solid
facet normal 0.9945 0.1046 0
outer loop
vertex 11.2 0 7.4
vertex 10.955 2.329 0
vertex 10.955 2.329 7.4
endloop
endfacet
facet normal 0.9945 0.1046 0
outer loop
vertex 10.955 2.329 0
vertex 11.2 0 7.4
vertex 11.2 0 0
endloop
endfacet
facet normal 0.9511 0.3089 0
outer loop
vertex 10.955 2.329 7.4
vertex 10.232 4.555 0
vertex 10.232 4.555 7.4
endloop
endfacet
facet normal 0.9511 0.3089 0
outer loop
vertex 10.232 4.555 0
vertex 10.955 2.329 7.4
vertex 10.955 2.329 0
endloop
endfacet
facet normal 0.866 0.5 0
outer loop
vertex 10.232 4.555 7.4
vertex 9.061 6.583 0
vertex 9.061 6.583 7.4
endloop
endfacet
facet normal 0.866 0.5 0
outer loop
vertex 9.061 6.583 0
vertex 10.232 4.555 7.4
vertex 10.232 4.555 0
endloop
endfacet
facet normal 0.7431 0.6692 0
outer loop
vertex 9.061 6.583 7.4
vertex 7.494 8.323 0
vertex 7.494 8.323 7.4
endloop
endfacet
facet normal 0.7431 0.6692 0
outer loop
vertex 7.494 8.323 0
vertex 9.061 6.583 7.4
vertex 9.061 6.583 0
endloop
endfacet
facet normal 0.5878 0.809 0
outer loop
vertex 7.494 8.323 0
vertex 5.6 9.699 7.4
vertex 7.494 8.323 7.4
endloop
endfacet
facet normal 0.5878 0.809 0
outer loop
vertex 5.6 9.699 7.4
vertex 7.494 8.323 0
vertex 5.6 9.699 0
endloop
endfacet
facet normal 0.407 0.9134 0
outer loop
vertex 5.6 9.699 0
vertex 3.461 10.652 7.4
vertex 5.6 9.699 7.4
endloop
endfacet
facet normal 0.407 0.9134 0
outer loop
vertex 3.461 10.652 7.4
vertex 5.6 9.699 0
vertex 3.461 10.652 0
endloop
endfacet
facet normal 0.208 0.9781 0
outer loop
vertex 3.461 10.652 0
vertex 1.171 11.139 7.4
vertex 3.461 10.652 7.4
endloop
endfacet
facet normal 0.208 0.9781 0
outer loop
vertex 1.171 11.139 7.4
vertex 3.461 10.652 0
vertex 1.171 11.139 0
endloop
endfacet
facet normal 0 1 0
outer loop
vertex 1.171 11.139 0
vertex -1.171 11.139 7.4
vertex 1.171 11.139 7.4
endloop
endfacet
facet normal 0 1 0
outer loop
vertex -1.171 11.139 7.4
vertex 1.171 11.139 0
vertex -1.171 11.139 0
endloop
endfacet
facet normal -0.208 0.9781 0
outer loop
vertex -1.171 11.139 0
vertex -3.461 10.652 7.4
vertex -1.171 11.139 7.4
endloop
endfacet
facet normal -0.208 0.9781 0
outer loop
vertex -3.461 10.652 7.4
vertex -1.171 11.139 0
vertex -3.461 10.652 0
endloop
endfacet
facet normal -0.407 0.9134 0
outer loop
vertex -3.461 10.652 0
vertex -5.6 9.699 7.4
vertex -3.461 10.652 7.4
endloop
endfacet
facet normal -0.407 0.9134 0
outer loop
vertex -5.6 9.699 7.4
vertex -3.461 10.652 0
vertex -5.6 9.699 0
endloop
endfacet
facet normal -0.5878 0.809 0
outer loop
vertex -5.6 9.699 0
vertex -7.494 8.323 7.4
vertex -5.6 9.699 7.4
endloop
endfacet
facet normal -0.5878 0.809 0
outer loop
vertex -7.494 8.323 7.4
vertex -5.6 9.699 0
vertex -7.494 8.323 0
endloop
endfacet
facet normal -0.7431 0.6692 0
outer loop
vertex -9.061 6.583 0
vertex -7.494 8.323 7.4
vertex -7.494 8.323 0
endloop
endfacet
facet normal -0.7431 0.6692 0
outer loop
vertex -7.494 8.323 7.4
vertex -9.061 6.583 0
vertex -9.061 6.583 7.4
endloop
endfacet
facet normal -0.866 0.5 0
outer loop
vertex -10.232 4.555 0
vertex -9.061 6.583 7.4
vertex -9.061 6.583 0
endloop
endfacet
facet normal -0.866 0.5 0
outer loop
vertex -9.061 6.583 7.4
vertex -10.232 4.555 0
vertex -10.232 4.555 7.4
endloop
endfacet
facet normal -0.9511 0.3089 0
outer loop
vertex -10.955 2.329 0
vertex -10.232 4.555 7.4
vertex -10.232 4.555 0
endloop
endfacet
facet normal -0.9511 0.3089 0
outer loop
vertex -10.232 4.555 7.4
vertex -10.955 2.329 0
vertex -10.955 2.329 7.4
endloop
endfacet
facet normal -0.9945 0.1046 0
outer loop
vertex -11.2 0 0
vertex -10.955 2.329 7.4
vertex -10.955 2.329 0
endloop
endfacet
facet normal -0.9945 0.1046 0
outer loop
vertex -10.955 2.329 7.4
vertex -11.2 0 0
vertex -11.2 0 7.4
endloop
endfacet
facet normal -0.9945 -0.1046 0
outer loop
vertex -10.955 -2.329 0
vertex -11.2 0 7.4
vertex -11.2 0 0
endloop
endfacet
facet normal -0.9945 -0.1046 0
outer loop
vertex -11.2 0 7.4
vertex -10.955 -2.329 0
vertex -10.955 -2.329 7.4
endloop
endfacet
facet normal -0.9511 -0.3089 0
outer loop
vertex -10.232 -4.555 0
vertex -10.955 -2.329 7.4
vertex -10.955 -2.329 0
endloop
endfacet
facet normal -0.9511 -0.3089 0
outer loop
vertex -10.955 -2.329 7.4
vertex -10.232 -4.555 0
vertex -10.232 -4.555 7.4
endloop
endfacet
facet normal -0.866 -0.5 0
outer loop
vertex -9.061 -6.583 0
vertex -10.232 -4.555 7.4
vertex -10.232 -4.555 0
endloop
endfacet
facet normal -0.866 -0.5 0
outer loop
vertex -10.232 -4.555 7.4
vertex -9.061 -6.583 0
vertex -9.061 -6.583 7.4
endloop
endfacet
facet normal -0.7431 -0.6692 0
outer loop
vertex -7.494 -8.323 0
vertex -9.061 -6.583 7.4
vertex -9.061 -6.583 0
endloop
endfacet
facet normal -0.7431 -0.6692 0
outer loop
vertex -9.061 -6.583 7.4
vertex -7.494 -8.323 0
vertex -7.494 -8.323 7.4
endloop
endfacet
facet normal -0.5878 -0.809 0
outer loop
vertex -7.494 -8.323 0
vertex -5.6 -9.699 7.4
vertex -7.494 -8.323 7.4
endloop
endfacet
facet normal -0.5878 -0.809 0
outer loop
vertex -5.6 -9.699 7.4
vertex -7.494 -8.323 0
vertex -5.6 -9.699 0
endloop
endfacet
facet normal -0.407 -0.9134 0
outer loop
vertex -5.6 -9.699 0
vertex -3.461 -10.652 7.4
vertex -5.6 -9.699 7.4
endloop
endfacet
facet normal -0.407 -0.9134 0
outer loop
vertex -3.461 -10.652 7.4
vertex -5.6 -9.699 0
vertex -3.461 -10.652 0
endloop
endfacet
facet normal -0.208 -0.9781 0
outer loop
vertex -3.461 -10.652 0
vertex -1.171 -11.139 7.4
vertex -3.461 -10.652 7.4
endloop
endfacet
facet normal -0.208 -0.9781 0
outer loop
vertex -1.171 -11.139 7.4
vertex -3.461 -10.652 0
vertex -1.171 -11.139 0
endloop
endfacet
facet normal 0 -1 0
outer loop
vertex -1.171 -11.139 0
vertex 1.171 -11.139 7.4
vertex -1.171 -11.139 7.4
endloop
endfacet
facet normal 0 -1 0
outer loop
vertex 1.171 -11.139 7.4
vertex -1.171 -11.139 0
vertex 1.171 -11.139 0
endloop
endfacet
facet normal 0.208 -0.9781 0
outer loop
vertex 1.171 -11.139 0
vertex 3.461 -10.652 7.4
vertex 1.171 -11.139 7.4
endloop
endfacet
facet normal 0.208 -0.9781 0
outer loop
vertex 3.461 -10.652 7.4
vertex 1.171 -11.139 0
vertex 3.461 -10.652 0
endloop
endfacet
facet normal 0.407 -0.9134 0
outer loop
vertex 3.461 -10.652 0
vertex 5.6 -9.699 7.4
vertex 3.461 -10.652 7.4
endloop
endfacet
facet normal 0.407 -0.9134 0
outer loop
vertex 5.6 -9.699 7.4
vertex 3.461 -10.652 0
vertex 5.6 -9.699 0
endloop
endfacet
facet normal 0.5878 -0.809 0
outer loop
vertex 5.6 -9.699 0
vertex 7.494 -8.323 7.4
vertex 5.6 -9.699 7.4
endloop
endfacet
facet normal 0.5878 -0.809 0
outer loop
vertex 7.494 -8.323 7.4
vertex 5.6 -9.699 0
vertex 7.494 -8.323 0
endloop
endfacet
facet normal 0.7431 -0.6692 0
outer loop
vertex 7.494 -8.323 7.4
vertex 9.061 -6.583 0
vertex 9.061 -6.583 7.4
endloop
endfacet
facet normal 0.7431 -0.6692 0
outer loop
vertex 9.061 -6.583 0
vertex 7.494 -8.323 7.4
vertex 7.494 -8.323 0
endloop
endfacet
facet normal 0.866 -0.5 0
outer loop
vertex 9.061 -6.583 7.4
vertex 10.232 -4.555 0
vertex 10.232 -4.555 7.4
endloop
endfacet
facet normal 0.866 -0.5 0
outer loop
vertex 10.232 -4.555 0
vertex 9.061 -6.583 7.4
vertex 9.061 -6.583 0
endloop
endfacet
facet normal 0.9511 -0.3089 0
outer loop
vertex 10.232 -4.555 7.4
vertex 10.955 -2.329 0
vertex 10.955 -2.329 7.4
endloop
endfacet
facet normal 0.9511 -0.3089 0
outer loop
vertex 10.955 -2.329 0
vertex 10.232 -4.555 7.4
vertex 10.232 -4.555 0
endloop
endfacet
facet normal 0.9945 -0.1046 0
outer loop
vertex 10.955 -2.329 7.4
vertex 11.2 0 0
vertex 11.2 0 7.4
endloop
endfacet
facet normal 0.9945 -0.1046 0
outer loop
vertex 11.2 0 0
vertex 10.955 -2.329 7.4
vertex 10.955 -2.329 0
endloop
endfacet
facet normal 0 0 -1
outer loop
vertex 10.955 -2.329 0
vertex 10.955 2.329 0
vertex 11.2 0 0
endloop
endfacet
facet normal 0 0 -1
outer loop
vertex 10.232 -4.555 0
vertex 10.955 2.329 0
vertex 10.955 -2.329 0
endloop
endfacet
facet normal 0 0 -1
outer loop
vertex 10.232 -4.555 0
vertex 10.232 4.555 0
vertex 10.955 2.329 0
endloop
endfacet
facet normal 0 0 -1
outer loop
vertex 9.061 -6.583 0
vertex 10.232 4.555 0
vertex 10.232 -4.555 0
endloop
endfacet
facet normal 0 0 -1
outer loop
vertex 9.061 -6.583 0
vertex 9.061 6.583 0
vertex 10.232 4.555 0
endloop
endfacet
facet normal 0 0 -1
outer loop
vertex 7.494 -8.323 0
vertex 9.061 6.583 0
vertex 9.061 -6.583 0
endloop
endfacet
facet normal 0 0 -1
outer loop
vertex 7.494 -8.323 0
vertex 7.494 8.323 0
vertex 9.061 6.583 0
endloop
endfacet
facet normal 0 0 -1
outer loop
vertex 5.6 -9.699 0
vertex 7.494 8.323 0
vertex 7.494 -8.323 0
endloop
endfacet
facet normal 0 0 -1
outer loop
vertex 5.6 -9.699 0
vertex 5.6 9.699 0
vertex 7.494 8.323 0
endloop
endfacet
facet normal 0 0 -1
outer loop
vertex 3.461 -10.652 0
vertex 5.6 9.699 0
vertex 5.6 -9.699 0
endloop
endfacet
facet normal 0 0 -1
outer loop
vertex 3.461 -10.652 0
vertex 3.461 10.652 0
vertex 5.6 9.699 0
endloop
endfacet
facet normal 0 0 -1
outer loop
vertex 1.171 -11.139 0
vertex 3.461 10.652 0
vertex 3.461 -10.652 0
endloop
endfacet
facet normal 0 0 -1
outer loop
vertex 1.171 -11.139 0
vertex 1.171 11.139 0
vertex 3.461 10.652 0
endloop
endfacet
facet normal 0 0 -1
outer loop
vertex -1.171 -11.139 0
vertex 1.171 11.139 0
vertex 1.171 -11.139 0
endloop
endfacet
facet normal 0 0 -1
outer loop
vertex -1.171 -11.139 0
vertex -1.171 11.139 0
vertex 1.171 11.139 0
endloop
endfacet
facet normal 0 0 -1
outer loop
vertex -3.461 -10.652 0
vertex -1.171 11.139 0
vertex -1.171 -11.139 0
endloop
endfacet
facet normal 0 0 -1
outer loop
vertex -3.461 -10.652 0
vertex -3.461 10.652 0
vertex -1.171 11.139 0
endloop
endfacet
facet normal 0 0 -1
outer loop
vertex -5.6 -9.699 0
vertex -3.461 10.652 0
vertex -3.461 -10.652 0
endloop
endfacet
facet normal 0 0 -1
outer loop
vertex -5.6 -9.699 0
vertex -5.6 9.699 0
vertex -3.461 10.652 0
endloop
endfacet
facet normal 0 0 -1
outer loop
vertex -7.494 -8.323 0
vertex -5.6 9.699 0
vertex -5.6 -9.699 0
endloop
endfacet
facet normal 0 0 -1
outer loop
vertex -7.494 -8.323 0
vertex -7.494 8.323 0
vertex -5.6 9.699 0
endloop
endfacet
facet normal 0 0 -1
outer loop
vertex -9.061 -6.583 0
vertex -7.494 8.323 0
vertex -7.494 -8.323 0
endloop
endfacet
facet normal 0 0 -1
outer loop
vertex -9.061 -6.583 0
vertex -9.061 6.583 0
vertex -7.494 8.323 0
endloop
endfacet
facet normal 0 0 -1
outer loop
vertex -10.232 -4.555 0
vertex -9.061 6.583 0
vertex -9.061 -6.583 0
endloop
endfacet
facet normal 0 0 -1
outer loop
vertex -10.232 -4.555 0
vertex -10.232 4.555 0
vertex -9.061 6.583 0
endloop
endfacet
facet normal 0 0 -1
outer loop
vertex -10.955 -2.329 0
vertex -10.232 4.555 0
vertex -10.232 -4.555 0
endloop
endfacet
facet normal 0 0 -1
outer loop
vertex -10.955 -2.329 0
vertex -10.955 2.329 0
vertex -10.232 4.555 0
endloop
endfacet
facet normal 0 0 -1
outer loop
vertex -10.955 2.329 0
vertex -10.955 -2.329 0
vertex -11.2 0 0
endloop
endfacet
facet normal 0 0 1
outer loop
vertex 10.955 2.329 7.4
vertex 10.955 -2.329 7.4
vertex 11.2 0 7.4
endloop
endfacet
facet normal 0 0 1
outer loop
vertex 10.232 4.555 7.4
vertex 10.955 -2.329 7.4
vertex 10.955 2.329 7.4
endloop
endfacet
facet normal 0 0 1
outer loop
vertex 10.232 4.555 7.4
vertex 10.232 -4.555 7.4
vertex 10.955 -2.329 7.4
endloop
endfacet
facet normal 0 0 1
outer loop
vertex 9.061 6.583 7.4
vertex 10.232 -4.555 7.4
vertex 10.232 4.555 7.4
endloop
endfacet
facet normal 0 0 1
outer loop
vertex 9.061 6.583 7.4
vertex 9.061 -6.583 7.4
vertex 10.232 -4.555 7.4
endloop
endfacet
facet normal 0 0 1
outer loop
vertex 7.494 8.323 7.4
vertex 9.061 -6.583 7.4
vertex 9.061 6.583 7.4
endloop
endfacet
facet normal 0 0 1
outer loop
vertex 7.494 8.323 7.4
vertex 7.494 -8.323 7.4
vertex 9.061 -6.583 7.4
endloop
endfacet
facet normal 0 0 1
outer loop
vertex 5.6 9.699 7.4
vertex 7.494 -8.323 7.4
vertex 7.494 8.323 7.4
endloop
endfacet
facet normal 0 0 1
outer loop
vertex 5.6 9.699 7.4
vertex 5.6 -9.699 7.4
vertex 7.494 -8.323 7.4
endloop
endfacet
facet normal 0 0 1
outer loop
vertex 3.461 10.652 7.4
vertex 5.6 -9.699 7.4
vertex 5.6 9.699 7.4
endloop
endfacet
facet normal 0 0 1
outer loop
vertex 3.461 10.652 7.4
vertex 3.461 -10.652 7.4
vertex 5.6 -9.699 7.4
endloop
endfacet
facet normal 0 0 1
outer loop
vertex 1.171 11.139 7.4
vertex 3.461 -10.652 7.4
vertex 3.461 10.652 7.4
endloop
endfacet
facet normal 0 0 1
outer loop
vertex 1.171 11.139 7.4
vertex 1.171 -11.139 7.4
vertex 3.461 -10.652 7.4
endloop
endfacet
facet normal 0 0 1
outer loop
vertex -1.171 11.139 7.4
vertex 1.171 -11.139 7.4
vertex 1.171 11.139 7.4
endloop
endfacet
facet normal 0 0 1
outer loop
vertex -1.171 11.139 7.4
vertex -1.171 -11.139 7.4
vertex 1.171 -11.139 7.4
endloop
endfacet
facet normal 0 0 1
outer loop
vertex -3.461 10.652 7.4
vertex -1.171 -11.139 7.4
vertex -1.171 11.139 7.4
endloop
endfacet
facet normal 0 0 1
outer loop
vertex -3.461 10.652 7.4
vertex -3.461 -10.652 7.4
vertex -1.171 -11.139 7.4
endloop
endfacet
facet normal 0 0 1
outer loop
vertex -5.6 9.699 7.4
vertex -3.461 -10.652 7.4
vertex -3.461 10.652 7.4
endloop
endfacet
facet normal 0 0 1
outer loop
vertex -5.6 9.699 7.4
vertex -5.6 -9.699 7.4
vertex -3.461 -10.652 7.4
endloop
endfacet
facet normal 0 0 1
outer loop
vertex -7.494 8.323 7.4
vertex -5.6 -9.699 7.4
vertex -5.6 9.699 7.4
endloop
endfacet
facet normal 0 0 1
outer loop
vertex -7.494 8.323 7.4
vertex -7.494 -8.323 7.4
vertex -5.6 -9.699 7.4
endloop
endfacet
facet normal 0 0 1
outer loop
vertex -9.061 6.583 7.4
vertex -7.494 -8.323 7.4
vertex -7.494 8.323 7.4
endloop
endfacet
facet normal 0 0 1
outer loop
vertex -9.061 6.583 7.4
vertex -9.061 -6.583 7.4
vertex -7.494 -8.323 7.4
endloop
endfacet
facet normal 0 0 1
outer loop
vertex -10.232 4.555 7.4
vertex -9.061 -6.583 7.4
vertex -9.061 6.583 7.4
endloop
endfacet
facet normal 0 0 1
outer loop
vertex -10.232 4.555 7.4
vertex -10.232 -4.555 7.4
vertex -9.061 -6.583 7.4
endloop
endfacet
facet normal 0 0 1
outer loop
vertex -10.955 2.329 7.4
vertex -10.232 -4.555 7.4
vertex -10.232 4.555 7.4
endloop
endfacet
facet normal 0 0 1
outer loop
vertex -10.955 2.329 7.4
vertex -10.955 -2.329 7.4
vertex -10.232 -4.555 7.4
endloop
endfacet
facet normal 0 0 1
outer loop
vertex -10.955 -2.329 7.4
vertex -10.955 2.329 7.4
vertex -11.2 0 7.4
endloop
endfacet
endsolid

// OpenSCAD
function 608BallBearingDiam(3dPrinterTolerance=.4) = 22+3dPrinterTolerance;
function 608BallBearingHeight(3dPrinterTolerance=.4) = 7+3dPrinterTolerance;
function 608BallBearingInnerDiam(3dPrinterTolerance=.4)= 8-3dPrinterTolerance;

function 608BallBearingAvgDiam(3dPrinterTolerance=.4)= (608BallBearingDiam(3dPrinterTolerance)+608BallBearingInnerDiam(3dPrinterTolerance))/2;


module 608BallBearing(3dPrinterTolerance=.4)
{
	union()
	{
		cylinder(608BallBearingHeight(3dPrinterTolerance), 608BallBearingDiam(3dPrinterTolerance)/2, 608BallBearingDiam(3dPrinterTolerance)/2, 0);
		//cylinder(608BallBearingHeight(3dPrinterTolerance), 608BallBearingInnerDiam(3dPrinterTolerance)/2, 608BallBearingInnerDiam(3dPrinterTolerance)/2);
	}
}

608BallBearing();
